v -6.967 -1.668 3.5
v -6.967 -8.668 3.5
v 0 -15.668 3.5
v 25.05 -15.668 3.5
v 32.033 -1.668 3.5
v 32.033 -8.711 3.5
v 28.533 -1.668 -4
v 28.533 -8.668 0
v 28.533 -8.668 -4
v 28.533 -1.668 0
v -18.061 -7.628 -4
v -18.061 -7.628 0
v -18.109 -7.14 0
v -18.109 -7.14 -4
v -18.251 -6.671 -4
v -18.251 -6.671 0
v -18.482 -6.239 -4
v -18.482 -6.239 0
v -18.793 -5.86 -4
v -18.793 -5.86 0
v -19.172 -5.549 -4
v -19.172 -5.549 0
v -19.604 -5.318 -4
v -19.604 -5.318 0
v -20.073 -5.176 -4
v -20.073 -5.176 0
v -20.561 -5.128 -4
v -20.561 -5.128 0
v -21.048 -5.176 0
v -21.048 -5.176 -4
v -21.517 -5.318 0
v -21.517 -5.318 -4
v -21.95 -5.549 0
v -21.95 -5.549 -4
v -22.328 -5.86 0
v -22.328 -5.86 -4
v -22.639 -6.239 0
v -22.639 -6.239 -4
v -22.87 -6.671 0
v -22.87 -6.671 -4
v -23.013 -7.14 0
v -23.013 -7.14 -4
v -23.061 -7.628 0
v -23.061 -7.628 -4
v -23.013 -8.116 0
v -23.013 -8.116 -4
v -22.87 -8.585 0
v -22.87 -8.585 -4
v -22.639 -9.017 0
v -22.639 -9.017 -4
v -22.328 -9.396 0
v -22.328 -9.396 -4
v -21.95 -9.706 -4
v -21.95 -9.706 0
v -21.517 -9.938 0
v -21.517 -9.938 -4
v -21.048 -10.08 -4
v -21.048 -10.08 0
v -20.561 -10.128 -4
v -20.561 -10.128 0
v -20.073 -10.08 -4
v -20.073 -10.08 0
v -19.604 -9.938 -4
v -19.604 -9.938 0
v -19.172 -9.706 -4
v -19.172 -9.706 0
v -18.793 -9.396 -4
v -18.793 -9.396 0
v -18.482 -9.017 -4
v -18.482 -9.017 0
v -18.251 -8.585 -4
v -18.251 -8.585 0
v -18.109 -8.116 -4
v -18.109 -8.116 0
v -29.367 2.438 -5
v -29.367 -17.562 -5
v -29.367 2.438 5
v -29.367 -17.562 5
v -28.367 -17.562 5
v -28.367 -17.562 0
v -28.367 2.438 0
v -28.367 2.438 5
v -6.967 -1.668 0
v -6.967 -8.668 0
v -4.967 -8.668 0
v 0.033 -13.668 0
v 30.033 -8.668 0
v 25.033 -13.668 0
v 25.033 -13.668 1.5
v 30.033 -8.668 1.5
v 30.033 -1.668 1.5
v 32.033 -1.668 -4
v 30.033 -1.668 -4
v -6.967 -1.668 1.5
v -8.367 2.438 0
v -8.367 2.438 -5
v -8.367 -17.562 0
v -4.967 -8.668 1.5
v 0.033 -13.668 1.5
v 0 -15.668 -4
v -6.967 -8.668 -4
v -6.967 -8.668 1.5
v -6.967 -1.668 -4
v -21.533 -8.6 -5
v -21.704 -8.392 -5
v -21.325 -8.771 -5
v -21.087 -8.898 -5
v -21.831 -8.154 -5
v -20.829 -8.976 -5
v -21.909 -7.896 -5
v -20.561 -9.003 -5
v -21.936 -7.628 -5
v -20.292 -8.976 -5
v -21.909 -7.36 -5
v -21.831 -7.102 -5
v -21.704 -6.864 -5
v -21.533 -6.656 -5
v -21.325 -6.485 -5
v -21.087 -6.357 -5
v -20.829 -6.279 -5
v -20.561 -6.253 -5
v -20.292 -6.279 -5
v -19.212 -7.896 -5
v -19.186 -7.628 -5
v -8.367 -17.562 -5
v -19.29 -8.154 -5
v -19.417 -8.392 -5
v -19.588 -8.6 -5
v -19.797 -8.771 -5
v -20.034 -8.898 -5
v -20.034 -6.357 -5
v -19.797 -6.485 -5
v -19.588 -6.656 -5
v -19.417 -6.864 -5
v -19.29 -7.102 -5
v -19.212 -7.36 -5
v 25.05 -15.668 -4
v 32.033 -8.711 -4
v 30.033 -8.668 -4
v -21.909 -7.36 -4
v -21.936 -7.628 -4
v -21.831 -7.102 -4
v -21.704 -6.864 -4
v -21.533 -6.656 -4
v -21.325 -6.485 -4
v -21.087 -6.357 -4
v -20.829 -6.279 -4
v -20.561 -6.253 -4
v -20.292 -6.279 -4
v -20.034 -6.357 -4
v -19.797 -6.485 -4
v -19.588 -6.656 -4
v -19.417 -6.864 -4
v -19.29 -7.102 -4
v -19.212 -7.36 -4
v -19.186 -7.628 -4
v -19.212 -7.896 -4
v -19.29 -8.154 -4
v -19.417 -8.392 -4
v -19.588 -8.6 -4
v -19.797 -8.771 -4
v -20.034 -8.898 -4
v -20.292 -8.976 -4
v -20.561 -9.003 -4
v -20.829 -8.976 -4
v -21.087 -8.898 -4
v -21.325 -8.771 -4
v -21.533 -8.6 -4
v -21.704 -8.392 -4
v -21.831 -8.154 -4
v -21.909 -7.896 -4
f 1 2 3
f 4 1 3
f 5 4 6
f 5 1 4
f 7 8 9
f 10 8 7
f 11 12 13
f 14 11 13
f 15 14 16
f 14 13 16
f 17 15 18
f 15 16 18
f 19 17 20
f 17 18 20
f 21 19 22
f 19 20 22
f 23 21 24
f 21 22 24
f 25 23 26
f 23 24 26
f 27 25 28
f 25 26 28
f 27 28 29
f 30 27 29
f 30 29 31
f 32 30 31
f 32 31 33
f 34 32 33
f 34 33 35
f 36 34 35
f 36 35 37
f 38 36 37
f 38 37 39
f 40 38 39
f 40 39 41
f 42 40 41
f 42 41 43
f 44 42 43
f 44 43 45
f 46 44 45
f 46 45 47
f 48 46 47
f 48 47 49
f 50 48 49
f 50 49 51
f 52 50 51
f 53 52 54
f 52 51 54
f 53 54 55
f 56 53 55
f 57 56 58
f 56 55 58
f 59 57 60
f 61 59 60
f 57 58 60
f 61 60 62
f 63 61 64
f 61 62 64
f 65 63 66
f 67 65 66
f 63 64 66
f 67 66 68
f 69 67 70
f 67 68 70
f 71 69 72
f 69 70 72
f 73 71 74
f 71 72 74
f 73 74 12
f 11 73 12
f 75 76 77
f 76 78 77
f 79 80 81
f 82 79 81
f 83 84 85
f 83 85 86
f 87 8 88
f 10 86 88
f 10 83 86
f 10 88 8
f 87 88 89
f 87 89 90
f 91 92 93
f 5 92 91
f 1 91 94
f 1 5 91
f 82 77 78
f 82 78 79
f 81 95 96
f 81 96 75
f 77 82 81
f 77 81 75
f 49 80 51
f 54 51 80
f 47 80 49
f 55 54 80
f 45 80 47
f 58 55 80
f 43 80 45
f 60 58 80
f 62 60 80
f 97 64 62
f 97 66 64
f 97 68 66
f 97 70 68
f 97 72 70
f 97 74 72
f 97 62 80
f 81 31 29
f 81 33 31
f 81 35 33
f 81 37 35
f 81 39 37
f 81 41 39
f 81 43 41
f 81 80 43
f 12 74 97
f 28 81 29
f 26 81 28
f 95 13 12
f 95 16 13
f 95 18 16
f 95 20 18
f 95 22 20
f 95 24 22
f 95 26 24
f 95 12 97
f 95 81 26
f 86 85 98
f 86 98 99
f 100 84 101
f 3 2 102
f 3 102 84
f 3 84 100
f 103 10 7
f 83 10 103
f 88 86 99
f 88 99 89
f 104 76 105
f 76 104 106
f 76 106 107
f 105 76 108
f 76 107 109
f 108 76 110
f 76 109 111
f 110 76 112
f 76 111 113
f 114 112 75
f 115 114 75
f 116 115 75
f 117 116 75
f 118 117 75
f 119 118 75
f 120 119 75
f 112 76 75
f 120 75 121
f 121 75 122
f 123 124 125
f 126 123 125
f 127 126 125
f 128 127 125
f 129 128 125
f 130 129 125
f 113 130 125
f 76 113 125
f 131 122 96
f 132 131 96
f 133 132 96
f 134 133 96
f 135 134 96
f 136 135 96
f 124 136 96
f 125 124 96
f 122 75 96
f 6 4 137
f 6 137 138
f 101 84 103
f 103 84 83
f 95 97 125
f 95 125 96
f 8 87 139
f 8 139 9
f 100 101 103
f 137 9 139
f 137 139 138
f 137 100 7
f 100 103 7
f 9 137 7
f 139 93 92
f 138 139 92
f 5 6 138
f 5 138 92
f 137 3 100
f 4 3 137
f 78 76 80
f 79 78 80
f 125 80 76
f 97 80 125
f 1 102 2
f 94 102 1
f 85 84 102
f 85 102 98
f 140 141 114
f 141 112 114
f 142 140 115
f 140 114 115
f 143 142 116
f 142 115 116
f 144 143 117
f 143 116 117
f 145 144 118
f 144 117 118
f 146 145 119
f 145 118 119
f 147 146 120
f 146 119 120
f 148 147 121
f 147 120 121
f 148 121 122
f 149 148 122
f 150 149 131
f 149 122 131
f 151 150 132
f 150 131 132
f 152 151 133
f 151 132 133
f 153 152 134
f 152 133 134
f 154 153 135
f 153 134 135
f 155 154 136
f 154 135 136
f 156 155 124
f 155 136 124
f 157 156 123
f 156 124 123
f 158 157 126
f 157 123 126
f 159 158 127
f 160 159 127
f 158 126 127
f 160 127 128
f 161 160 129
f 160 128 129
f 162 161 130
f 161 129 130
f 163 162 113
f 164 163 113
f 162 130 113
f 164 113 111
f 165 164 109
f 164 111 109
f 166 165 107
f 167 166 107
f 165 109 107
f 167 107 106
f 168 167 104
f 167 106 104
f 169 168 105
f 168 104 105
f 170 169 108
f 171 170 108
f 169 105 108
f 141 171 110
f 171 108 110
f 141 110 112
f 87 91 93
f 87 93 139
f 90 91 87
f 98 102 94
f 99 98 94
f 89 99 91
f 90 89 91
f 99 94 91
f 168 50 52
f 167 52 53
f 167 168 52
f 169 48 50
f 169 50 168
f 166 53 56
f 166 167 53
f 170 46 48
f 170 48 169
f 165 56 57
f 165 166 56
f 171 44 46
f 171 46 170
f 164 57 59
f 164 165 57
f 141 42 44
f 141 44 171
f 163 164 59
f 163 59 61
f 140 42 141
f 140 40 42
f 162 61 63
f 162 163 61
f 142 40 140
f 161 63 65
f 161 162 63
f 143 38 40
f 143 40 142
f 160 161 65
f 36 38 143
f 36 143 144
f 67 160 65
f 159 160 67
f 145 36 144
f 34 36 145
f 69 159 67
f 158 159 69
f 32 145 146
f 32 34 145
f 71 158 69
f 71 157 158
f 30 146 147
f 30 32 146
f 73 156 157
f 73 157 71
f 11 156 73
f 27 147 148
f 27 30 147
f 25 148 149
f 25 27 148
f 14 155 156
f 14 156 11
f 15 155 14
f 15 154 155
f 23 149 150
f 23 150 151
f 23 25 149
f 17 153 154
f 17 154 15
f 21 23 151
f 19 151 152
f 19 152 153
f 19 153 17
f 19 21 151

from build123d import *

# Parameters (mm, degrees)
F0_W           = 2
F0_H           = 7
F0_W_2         = 25
F0_H_2         = 5
F0_W_3         = 1.5
F1_DEPTH       = 3.5
F2_DEPTH       = 1.5
F3_DEPTH       = 4
F4_W           = 1
F4_H           = 20
F5_DEPTH       = 5
F4_W_2         = 20
F6_DEPTH       = 5
F8_D           = 2.75
F8_CBORE_D     = 5
F8_CBORE_DEPTH = 4


with BuildPart() as f1:
    # F0 (on Top) → F1 (new body)
    with BuildSketch(Plane.XY):
        with Locations((-5.9666161537, -5.1684066913)):
            Rectangle(F0_W, F0_H)
        Polygon((32.0333838463, -1.6684066913), (30.0333838463, -1.6684066913), (30.0333838463, -8.6684066913), (32.0333838463, -8.7107298896), align=None)
        Polygon((0.0333838463, -13.6684066913), (-4.9666161537, -8.6684066913), (-6.9666161537, -8.6684066913), (0, -15.6681280516), align=None)
        Polygon((25.0333838463, -13.6684066913), (0.0333838463, -13.6684066913), (0, -15.6681280516), (25.0503603182, -15.6681280516), align=None)
        Polygon((32.0333838463, -8.7107298896), (30.0333838463, -8.6684066913), (25.0333838463, -13.6684066913), (25.0503603182, -15.6681280516), align=None)
        with Locations((12.5333838463, -11.1684066913)):
            Rectangle(F0_W_2, F0_H_2)
        Polygon((0.0333838463, -8.6684066913), (-4.9666161537, -8.6684066913), (0.0333838463, -13.6684066913), align=None)
        Polygon((30.0333838463, -8.6684066913), (28.5333838463, -8.6684066913), (25.0333838463, -8.6684066913), (25.0333838463, -13.6684066913), align=None)
        Polygon((28.5333838463, -1.6684066913), (-4.9666161537, -1.6684066913), (-4.9666161537, -8.6684066913), (0.0333838463, -8.6684066913), (25.0333838463, -8.6684066913), (28.5333838463, -8.6684066913), align=None)
        with Locations((29.2833838463, -5.1684066913)):
            Rectangle(F0_W_3, F0_H)
    extrude(amount=F1_DEPTH)

    # F0 (on Top) → F2 (cut)
    with BuildSketch(Plane.XY):
        with Locations((29.2833838463, -5.1684066913)):
            Rectangle(F0_W_3, F0_H)
        Polygon((28.5333838463, -1.6684066913), (-4.9666161537, -1.6684066913), (-4.9666161537, -8.6684066913), (0.0333838463, -8.6684066913), (25.0333838463, -8.6684066913), (28.5333838463, -8.6684066913), align=None)
        Polygon((30.0333838463, -8.6684066913), (28.5333838463, -8.6684066913), (25.0333838463, -8.6684066913), (25.0333838463, -13.6684066913), align=None)
        with Locations((12.5333838463, -11.1684066913)):
            Rectangle(F0_W_2, F0_H_2)
        Polygon((0.0333838463, -8.6684066913), (-4.9666161537, -8.6684066913), (0.0333838463, -13.6684066913), align=None)
        with Locations((-5.9666161537, -5.1684066913)):
            Rectangle(F0_W, F0_H)
    extrude(amount=F2_DEPTH, mode=Mode.SUBTRACT)

    # F0 (on Top) → F3 (join)
    with BuildSketch(Plane.XY):
        Polygon((32.0333838463, -1.6684066913), (30.0333838463, -1.6684066913), (30.0333838463, -8.6684066913), (32.0333838463, -8.7107298896), align=None)
        Polygon((32.0333838463, -8.7107298896), (30.0333838463, -8.6684066913), (25.0333838463, -13.6684066913), (25.0503603182, -15.6681280516), align=None)
        Polygon((30.0333838463, -8.6684066913), (28.5333838463, -8.6684066913), (25.0333838463, -8.6684066913), (25.0333838463, -13.6684066913), align=None)
        Polygon((28.5333838463, -1.6684066913), (-4.9666161537, -1.6684066913), (-4.9666161537, -8.6684066913), (0.0333838463, -8.6684066913), (25.0333838463, -8.6684066913), (28.5333838463, -8.6684066913), align=None)
        with Locations((12.5333838463, -11.1684066913)):
            Rectangle(F0_W_2, F0_H_2)
        Polygon((25.0333838463, -13.6684066913), (0.0333838463, -13.6684066913), (0, -15.6681280516), (25.0503603182, -15.6681280516), align=None)
        Polygon((0.0333838463, -13.6684066913), (-4.9666161537, -8.6684066913), (-6.9666161537, -8.6684066913), (0, -15.6681280516), align=None)
        Polygon((0.0333838463, -8.6684066913), (-4.9666161537, -8.6684066913), (0.0333838463, -13.6684066913), align=None)
        with Locations((-5.9666161537, -5.1684066913)):
            Rectangle(F0_W, F0_H)
    extrude(amount=-F3_DEPTH)


with BuildPart() as f5:
    # F4 (on Top) → F5 (new body)
    with BuildSketch(Plane.XY):
        with Locations((-28.8674156551, -7.5615978579)):
            Rectangle(F4_W, F4_H)
    extrude(amount=F5_DEPTH)

    # F4 (on Top) → F6 (join)
    with BuildSketch(Plane.XY):
        with Locations((-18.3674156551, -7.5615978579)):
            Rectangle(F4_W_2, F4_H)
        with Locations((-28.8674156551, -7.5615978579)):
            Rectangle(F4_W, F4_H)
    extrude(amount=-F6_DEPTH)

    # F8 (through all)
    with Locations(Plane.XY):
        with Locations((-20.560676232, -7.6278164051), (-20.560676232, -7.6278164051)):
            CounterBoreHole(F8_D / 2, F8_CBORE_D / 2, F8_CBORE_DEPTH)


solid = Compound([f1.part, f5.part])
